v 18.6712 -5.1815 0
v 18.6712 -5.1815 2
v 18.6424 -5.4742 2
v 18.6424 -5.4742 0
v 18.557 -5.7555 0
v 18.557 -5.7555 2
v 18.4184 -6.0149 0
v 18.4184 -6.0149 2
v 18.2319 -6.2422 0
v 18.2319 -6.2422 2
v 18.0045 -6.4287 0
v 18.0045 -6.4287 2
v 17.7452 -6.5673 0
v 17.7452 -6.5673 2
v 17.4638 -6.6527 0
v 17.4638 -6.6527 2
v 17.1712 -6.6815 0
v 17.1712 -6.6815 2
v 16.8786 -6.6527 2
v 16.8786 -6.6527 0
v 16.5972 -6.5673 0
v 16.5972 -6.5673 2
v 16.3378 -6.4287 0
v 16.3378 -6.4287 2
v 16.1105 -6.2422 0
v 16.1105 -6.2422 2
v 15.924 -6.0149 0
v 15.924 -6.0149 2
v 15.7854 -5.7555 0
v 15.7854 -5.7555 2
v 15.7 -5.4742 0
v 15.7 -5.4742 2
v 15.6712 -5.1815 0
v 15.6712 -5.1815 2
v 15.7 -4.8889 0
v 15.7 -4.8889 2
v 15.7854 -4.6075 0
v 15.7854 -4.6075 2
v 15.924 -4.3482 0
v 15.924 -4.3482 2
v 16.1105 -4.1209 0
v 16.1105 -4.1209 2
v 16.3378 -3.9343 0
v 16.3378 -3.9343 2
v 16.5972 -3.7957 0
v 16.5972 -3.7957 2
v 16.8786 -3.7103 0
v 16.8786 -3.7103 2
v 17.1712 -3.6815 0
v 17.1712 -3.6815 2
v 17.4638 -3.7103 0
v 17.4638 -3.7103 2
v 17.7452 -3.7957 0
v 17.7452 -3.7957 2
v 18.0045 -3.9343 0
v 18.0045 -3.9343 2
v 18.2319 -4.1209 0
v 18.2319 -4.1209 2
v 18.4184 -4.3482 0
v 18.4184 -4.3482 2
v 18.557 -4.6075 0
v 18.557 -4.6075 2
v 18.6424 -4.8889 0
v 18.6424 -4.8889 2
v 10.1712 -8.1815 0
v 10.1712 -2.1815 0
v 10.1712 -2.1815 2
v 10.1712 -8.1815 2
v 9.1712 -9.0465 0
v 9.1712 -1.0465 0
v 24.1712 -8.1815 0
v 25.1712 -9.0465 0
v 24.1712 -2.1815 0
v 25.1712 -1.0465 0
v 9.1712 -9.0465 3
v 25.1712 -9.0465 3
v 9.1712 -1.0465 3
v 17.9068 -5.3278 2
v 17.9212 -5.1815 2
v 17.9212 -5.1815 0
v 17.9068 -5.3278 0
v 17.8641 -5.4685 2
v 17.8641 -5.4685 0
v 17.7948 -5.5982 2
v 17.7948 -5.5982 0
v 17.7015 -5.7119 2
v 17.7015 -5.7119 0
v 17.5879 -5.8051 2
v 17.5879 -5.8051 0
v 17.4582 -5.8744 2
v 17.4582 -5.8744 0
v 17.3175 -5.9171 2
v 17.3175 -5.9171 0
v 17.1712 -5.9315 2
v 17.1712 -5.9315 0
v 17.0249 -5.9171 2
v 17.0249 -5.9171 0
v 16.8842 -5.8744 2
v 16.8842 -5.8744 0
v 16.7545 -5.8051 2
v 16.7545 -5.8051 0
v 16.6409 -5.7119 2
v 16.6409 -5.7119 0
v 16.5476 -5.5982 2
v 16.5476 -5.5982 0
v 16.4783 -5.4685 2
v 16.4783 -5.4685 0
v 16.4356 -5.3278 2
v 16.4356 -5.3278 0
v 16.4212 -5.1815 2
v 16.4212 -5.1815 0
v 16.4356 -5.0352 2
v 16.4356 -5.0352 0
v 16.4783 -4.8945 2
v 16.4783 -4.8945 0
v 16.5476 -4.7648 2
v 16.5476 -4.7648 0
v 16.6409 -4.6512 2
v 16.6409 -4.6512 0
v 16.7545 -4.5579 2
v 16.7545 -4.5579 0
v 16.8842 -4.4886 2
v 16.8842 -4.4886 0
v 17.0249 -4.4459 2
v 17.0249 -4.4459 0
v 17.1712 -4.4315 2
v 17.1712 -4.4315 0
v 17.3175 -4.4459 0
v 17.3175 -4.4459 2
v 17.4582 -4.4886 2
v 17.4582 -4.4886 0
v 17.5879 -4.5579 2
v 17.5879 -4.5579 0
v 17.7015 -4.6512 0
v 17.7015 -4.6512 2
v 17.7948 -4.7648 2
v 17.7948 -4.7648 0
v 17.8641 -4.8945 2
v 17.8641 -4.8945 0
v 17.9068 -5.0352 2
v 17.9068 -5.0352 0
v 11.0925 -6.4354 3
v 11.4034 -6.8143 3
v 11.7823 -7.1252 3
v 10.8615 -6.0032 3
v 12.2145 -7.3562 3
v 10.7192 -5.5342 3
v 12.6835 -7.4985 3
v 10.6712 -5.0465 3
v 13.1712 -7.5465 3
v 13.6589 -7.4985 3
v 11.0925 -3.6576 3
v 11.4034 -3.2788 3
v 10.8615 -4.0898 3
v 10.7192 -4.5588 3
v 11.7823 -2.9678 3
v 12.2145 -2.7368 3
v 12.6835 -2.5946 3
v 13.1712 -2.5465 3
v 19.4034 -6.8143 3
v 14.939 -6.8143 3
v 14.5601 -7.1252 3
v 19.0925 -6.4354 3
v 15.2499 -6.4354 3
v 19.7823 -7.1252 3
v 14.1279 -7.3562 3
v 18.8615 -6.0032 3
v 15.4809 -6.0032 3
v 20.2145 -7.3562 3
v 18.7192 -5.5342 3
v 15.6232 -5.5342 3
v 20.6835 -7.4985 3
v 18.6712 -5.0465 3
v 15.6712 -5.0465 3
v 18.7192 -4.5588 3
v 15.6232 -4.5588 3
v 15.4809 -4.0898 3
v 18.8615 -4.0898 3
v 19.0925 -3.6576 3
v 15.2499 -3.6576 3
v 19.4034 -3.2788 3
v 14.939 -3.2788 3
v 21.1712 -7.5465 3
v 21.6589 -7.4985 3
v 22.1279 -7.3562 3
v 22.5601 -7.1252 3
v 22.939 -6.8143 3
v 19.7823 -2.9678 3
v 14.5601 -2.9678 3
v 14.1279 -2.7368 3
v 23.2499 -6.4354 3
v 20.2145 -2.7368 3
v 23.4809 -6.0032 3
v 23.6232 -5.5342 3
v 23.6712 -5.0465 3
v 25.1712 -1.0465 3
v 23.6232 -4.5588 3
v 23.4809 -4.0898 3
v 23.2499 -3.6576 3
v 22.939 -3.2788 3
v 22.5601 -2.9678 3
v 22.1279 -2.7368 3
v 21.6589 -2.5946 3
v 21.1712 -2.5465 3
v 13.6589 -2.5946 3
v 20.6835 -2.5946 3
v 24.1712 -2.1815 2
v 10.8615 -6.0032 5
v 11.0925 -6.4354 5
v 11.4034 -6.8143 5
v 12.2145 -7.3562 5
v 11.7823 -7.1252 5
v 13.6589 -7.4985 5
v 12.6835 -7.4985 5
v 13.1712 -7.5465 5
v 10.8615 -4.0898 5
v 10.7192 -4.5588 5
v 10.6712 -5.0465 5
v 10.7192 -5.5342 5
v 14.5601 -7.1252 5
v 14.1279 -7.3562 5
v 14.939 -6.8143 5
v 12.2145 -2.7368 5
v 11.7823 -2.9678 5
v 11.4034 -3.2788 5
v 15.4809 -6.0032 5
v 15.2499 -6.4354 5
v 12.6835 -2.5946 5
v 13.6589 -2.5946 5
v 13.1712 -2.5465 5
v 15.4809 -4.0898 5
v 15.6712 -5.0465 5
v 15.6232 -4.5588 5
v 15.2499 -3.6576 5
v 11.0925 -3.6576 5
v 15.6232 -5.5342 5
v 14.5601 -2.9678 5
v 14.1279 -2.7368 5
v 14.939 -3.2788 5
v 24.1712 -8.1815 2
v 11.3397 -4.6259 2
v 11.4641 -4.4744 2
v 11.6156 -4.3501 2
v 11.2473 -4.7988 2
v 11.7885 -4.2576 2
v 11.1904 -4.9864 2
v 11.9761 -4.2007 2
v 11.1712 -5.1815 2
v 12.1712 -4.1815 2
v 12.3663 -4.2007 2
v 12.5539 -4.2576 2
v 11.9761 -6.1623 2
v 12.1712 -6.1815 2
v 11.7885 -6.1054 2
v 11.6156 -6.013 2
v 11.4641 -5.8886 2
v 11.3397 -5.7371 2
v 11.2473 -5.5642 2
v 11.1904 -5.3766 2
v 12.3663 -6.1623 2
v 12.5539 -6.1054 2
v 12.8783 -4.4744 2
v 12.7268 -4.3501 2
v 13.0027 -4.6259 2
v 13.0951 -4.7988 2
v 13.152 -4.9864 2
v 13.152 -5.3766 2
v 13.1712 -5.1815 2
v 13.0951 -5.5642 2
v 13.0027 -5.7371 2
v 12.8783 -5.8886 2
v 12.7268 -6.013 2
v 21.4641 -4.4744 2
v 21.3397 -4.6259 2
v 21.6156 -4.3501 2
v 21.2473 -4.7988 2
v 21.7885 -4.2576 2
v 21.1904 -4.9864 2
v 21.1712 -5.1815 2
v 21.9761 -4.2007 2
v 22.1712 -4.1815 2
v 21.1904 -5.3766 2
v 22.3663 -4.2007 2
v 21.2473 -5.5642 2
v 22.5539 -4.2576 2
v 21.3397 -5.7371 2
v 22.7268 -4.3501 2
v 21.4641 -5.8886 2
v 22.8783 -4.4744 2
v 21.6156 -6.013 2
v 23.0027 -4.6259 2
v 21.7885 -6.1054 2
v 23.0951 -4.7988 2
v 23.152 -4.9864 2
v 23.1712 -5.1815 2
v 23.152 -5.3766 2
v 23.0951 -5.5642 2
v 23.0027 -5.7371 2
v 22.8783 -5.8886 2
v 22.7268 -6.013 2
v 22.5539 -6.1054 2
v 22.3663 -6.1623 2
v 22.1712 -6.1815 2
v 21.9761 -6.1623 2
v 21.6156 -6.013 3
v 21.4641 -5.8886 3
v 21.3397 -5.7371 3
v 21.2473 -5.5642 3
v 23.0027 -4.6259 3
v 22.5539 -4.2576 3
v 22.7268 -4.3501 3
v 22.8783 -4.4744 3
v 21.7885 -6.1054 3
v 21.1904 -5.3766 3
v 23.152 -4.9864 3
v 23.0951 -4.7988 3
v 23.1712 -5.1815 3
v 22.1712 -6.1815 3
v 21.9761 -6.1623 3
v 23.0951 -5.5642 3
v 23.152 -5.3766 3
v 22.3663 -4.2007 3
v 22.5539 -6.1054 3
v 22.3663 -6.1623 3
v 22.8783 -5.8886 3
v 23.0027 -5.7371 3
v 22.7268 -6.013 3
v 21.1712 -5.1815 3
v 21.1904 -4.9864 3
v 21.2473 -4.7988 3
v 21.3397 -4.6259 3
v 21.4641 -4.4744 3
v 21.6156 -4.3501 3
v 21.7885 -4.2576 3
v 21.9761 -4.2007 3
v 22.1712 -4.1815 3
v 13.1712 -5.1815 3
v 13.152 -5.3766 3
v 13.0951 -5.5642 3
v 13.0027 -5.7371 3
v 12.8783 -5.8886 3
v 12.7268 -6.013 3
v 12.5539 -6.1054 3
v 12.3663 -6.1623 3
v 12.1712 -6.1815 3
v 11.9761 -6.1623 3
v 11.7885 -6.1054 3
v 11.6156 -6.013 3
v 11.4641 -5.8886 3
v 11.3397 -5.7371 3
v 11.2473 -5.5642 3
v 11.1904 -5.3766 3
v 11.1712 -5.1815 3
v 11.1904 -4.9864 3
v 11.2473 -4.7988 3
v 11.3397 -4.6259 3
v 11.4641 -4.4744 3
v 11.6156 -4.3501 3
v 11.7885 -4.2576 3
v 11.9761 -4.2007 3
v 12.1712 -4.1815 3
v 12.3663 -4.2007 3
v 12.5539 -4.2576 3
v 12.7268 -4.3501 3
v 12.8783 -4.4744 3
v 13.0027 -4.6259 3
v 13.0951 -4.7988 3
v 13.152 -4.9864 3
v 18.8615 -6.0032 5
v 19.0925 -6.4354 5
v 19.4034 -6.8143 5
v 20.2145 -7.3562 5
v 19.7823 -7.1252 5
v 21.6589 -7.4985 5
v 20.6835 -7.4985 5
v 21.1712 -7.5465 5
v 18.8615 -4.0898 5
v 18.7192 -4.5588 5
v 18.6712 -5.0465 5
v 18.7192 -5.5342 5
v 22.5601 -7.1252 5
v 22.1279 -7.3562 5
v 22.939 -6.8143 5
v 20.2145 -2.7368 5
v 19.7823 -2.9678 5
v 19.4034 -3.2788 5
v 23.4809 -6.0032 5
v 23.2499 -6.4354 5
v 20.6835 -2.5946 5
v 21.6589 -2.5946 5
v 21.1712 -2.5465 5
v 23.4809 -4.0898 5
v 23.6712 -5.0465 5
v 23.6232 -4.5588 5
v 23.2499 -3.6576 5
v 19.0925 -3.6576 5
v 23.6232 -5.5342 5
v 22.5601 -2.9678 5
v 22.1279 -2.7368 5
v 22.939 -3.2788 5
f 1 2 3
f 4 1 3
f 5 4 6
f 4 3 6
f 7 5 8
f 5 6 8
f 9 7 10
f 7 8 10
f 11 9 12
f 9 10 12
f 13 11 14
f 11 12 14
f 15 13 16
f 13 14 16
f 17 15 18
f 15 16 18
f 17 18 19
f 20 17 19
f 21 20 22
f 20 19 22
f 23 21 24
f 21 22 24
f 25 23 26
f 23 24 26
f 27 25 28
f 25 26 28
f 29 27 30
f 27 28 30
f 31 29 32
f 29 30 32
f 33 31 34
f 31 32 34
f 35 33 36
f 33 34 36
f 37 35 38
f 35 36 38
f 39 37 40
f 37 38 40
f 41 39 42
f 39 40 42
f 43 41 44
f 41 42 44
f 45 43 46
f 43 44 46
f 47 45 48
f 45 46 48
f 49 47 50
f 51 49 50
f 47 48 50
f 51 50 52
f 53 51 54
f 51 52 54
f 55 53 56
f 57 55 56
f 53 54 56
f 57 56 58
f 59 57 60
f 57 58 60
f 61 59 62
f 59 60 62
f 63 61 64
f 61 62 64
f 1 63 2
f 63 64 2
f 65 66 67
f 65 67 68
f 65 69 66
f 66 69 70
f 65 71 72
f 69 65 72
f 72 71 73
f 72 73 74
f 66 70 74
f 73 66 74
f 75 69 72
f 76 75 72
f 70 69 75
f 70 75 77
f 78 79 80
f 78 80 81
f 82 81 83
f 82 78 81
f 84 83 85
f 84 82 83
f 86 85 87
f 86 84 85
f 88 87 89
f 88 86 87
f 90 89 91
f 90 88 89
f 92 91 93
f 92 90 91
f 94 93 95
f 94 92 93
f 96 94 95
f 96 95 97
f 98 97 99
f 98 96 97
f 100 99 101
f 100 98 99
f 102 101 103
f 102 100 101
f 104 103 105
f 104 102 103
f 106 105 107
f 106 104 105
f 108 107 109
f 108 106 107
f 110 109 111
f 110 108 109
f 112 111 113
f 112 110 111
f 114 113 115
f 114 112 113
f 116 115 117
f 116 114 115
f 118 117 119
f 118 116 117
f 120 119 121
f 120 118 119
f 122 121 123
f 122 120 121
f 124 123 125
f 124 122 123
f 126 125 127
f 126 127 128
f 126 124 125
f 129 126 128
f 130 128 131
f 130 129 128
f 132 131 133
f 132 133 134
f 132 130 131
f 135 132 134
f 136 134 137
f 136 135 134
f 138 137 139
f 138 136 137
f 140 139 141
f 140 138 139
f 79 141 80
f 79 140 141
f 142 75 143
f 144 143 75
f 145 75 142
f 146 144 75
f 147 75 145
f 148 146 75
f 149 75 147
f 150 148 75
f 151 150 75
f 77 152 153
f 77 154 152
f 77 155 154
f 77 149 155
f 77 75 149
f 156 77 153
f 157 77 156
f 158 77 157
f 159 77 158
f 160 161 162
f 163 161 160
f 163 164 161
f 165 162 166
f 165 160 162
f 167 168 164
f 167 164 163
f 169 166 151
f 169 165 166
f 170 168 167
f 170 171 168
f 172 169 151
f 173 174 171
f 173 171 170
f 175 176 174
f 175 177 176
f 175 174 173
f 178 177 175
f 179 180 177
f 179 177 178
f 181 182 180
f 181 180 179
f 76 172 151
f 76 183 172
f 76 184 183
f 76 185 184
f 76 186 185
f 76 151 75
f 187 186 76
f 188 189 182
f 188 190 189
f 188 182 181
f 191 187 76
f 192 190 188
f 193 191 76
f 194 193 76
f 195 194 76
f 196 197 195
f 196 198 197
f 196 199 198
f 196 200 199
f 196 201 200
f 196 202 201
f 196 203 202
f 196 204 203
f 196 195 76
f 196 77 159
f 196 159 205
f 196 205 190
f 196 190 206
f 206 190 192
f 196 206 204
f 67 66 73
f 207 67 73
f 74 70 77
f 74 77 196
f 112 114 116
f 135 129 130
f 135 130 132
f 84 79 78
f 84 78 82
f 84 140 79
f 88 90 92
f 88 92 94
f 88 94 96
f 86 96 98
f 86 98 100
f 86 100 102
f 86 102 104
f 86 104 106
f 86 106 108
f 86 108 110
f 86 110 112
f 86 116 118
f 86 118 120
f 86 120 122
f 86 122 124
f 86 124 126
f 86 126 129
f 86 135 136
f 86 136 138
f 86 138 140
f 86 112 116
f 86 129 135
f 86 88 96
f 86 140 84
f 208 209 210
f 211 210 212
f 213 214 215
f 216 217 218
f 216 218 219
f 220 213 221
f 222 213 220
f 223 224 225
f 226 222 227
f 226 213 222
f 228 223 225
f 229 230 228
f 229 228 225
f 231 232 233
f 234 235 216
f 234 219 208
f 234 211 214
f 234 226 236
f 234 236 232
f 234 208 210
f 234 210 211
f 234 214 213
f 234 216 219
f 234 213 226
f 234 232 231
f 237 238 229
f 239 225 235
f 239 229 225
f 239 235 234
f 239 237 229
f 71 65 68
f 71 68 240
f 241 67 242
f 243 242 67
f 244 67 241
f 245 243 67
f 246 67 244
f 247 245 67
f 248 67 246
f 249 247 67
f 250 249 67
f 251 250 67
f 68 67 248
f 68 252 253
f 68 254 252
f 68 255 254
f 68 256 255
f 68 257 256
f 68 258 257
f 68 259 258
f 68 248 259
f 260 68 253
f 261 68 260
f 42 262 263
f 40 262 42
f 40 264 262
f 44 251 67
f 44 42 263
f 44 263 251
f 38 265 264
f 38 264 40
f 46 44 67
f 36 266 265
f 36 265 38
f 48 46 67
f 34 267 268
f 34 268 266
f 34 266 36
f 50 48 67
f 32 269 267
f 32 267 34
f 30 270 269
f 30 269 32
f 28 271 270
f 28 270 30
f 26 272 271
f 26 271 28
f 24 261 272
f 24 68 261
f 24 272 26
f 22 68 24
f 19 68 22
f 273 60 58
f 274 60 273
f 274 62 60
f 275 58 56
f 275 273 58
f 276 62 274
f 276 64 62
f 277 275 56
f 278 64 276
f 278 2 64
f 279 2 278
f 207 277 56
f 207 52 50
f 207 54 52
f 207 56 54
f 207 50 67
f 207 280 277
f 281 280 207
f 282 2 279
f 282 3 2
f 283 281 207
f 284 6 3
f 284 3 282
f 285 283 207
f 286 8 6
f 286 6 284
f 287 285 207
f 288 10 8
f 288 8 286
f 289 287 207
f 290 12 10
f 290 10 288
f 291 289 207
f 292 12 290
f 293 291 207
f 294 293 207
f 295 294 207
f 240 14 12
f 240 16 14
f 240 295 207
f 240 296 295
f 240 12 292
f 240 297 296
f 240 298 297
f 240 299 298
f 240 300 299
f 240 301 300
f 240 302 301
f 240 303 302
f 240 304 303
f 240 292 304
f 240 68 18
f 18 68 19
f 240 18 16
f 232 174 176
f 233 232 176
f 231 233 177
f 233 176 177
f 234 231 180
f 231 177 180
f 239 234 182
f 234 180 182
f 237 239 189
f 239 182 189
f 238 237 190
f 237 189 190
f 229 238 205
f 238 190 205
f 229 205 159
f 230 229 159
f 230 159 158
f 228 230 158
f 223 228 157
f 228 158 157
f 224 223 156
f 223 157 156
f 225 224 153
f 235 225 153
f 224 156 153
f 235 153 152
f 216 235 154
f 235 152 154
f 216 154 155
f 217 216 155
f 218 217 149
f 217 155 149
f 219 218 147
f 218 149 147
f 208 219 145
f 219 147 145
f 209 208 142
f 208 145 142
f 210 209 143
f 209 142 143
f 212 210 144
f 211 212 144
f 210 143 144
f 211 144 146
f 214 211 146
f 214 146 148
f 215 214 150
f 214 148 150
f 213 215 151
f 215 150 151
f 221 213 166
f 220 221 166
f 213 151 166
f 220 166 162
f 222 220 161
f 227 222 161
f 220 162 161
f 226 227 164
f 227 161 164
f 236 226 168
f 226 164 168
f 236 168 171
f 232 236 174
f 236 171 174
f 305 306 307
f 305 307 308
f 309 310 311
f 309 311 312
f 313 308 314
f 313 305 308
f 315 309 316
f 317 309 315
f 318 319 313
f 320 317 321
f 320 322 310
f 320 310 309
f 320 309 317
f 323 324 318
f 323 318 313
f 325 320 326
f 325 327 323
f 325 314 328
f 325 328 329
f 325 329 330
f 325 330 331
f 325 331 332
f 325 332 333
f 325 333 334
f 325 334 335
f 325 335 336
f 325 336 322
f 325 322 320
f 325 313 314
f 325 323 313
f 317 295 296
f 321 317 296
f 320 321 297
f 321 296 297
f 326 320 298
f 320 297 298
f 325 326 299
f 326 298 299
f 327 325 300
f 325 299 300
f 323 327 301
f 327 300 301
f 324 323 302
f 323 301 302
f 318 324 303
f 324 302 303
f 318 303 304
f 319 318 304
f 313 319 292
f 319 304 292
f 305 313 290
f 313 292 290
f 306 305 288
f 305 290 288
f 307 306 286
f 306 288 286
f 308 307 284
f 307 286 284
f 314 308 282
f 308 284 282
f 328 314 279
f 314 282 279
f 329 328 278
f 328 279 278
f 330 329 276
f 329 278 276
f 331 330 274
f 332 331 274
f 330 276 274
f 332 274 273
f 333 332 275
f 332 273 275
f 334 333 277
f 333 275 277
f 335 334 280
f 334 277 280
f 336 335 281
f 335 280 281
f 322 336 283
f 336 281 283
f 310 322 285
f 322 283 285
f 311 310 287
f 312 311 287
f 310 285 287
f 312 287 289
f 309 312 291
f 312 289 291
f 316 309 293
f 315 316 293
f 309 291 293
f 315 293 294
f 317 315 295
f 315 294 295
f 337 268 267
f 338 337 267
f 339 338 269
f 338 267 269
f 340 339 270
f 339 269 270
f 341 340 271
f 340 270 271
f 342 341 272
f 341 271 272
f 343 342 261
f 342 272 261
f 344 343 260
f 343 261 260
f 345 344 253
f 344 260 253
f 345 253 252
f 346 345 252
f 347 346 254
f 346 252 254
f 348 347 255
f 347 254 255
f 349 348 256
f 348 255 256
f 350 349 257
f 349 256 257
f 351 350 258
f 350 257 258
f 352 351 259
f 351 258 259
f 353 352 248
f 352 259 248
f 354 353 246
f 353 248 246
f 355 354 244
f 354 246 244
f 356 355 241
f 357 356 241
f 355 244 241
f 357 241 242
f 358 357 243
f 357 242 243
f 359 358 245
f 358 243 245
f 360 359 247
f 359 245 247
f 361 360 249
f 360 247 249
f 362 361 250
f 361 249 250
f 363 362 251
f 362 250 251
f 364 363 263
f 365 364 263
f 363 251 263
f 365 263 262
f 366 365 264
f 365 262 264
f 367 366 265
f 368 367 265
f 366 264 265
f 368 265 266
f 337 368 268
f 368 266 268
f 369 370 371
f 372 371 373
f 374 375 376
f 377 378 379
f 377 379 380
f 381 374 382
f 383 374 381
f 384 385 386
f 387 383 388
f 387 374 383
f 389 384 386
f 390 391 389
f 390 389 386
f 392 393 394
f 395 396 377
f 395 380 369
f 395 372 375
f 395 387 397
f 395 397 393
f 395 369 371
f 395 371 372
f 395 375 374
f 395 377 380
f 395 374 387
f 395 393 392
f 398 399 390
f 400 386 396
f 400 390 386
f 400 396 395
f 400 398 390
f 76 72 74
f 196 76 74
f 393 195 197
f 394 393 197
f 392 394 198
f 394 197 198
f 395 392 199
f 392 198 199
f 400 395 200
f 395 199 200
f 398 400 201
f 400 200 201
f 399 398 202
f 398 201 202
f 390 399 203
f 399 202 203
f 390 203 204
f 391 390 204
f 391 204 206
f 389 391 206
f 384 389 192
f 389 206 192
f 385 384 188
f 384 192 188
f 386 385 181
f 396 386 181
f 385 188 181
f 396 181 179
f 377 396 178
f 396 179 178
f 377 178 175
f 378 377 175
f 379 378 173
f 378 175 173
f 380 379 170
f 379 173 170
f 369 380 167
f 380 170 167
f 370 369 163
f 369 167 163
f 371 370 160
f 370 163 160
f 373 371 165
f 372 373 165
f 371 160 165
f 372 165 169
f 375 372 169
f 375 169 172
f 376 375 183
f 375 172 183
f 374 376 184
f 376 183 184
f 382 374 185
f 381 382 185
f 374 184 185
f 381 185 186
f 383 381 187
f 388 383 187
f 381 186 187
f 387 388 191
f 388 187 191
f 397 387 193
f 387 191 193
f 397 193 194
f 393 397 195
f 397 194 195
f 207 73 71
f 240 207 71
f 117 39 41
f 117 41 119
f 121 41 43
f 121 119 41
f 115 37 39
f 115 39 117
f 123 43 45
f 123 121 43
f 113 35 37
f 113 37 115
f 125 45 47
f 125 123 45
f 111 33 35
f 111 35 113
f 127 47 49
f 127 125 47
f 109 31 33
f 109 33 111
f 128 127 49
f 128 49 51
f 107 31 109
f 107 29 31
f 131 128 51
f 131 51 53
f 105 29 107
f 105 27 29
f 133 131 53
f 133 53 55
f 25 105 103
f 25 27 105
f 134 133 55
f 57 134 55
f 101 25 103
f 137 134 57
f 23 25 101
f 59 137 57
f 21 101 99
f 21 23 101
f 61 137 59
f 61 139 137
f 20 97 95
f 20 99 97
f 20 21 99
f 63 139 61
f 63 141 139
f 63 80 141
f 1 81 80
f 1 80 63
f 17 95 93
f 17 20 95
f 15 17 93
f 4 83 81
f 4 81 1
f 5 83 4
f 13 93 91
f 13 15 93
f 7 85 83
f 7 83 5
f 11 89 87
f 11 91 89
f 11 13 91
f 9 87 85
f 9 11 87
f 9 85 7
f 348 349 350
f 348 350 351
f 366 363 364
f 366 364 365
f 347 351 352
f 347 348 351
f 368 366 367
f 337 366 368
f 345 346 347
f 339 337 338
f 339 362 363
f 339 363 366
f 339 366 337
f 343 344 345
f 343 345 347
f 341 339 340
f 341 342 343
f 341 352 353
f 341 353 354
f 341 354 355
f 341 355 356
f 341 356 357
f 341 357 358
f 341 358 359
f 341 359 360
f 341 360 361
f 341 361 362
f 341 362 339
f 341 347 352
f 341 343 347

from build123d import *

# Parameters (mm, degrees)
F0_W     = 16
F0_H     = 8
F1_DEPTH = 3
F2_R     = 2.5
F3_DEPTH = 2
F4_W     = 14
F4_H     = 6
F5_DEPTH = 2
F6_R     = 1.5
F6_R_2   = 0.75
F7_DEPTH = 2
F8_R     = 1
F9_DEPTH = 1


with BuildPart() as f1:
    # F0 (on Top) → F1 (new body)
    with BuildSketch(Plane.XY):
        with Locations((17.171192, -5.046524)):
            Rectangle(F0_W, F0_H)
    extrude(amount=F1_DEPTH)

    # F2 (on face) → F3 (join)
    with BuildSketch(Plane.XY.offset(3)):
        with Locations((13.171192, -5.046524)):
            Circle(F2_R)
        with Locations((21.171192, -5.046524)):
            Circle(F2_R)
    extrude(amount=F3_DEPTH)

    # F4 (on face) → F5 (cut)
    with BuildSketch(Plane(origin=(0, 0, 0), x_dir=(1, 0, 0), z_dir=(0, 0, -1))):
        with Locations((17.171192, 5.18152)):
            Rectangle(F4_W, F4_H)
    extrude(amount=-F5_DEPTH, mode=Mode.SUBTRACT)

    # F6 (on face) → F7 (join)
    with BuildSketch(Plane(origin=(0, 0, 2), x_dir=(1, 0, 0), z_dir=(0, 0, -1))):
        with Locations((17.171192, 5.18152)):
            Circle(F6_R)
        with Locations((17.171192, 5.18152)):
            Circle(F6_R_2, mode=Mode.SUBTRACT)
    extrude(amount=F7_DEPTH)

    # F8 (on face) → F9 (cut)
    with BuildSketch(Plane(origin=(0, 0, 2), x_dir=(1, 0, 0), z_dir=(0, 0, -1))):
        with Locations((12.171192, 5.18152)):
            Circle(F8_R)
        with Locations((22.171192, 5.18152)):
            Circle(F8_R)
    extrude(amount=-F9_DEPTH, mode=Mode.SUBTRACT)


solid = f1.part
